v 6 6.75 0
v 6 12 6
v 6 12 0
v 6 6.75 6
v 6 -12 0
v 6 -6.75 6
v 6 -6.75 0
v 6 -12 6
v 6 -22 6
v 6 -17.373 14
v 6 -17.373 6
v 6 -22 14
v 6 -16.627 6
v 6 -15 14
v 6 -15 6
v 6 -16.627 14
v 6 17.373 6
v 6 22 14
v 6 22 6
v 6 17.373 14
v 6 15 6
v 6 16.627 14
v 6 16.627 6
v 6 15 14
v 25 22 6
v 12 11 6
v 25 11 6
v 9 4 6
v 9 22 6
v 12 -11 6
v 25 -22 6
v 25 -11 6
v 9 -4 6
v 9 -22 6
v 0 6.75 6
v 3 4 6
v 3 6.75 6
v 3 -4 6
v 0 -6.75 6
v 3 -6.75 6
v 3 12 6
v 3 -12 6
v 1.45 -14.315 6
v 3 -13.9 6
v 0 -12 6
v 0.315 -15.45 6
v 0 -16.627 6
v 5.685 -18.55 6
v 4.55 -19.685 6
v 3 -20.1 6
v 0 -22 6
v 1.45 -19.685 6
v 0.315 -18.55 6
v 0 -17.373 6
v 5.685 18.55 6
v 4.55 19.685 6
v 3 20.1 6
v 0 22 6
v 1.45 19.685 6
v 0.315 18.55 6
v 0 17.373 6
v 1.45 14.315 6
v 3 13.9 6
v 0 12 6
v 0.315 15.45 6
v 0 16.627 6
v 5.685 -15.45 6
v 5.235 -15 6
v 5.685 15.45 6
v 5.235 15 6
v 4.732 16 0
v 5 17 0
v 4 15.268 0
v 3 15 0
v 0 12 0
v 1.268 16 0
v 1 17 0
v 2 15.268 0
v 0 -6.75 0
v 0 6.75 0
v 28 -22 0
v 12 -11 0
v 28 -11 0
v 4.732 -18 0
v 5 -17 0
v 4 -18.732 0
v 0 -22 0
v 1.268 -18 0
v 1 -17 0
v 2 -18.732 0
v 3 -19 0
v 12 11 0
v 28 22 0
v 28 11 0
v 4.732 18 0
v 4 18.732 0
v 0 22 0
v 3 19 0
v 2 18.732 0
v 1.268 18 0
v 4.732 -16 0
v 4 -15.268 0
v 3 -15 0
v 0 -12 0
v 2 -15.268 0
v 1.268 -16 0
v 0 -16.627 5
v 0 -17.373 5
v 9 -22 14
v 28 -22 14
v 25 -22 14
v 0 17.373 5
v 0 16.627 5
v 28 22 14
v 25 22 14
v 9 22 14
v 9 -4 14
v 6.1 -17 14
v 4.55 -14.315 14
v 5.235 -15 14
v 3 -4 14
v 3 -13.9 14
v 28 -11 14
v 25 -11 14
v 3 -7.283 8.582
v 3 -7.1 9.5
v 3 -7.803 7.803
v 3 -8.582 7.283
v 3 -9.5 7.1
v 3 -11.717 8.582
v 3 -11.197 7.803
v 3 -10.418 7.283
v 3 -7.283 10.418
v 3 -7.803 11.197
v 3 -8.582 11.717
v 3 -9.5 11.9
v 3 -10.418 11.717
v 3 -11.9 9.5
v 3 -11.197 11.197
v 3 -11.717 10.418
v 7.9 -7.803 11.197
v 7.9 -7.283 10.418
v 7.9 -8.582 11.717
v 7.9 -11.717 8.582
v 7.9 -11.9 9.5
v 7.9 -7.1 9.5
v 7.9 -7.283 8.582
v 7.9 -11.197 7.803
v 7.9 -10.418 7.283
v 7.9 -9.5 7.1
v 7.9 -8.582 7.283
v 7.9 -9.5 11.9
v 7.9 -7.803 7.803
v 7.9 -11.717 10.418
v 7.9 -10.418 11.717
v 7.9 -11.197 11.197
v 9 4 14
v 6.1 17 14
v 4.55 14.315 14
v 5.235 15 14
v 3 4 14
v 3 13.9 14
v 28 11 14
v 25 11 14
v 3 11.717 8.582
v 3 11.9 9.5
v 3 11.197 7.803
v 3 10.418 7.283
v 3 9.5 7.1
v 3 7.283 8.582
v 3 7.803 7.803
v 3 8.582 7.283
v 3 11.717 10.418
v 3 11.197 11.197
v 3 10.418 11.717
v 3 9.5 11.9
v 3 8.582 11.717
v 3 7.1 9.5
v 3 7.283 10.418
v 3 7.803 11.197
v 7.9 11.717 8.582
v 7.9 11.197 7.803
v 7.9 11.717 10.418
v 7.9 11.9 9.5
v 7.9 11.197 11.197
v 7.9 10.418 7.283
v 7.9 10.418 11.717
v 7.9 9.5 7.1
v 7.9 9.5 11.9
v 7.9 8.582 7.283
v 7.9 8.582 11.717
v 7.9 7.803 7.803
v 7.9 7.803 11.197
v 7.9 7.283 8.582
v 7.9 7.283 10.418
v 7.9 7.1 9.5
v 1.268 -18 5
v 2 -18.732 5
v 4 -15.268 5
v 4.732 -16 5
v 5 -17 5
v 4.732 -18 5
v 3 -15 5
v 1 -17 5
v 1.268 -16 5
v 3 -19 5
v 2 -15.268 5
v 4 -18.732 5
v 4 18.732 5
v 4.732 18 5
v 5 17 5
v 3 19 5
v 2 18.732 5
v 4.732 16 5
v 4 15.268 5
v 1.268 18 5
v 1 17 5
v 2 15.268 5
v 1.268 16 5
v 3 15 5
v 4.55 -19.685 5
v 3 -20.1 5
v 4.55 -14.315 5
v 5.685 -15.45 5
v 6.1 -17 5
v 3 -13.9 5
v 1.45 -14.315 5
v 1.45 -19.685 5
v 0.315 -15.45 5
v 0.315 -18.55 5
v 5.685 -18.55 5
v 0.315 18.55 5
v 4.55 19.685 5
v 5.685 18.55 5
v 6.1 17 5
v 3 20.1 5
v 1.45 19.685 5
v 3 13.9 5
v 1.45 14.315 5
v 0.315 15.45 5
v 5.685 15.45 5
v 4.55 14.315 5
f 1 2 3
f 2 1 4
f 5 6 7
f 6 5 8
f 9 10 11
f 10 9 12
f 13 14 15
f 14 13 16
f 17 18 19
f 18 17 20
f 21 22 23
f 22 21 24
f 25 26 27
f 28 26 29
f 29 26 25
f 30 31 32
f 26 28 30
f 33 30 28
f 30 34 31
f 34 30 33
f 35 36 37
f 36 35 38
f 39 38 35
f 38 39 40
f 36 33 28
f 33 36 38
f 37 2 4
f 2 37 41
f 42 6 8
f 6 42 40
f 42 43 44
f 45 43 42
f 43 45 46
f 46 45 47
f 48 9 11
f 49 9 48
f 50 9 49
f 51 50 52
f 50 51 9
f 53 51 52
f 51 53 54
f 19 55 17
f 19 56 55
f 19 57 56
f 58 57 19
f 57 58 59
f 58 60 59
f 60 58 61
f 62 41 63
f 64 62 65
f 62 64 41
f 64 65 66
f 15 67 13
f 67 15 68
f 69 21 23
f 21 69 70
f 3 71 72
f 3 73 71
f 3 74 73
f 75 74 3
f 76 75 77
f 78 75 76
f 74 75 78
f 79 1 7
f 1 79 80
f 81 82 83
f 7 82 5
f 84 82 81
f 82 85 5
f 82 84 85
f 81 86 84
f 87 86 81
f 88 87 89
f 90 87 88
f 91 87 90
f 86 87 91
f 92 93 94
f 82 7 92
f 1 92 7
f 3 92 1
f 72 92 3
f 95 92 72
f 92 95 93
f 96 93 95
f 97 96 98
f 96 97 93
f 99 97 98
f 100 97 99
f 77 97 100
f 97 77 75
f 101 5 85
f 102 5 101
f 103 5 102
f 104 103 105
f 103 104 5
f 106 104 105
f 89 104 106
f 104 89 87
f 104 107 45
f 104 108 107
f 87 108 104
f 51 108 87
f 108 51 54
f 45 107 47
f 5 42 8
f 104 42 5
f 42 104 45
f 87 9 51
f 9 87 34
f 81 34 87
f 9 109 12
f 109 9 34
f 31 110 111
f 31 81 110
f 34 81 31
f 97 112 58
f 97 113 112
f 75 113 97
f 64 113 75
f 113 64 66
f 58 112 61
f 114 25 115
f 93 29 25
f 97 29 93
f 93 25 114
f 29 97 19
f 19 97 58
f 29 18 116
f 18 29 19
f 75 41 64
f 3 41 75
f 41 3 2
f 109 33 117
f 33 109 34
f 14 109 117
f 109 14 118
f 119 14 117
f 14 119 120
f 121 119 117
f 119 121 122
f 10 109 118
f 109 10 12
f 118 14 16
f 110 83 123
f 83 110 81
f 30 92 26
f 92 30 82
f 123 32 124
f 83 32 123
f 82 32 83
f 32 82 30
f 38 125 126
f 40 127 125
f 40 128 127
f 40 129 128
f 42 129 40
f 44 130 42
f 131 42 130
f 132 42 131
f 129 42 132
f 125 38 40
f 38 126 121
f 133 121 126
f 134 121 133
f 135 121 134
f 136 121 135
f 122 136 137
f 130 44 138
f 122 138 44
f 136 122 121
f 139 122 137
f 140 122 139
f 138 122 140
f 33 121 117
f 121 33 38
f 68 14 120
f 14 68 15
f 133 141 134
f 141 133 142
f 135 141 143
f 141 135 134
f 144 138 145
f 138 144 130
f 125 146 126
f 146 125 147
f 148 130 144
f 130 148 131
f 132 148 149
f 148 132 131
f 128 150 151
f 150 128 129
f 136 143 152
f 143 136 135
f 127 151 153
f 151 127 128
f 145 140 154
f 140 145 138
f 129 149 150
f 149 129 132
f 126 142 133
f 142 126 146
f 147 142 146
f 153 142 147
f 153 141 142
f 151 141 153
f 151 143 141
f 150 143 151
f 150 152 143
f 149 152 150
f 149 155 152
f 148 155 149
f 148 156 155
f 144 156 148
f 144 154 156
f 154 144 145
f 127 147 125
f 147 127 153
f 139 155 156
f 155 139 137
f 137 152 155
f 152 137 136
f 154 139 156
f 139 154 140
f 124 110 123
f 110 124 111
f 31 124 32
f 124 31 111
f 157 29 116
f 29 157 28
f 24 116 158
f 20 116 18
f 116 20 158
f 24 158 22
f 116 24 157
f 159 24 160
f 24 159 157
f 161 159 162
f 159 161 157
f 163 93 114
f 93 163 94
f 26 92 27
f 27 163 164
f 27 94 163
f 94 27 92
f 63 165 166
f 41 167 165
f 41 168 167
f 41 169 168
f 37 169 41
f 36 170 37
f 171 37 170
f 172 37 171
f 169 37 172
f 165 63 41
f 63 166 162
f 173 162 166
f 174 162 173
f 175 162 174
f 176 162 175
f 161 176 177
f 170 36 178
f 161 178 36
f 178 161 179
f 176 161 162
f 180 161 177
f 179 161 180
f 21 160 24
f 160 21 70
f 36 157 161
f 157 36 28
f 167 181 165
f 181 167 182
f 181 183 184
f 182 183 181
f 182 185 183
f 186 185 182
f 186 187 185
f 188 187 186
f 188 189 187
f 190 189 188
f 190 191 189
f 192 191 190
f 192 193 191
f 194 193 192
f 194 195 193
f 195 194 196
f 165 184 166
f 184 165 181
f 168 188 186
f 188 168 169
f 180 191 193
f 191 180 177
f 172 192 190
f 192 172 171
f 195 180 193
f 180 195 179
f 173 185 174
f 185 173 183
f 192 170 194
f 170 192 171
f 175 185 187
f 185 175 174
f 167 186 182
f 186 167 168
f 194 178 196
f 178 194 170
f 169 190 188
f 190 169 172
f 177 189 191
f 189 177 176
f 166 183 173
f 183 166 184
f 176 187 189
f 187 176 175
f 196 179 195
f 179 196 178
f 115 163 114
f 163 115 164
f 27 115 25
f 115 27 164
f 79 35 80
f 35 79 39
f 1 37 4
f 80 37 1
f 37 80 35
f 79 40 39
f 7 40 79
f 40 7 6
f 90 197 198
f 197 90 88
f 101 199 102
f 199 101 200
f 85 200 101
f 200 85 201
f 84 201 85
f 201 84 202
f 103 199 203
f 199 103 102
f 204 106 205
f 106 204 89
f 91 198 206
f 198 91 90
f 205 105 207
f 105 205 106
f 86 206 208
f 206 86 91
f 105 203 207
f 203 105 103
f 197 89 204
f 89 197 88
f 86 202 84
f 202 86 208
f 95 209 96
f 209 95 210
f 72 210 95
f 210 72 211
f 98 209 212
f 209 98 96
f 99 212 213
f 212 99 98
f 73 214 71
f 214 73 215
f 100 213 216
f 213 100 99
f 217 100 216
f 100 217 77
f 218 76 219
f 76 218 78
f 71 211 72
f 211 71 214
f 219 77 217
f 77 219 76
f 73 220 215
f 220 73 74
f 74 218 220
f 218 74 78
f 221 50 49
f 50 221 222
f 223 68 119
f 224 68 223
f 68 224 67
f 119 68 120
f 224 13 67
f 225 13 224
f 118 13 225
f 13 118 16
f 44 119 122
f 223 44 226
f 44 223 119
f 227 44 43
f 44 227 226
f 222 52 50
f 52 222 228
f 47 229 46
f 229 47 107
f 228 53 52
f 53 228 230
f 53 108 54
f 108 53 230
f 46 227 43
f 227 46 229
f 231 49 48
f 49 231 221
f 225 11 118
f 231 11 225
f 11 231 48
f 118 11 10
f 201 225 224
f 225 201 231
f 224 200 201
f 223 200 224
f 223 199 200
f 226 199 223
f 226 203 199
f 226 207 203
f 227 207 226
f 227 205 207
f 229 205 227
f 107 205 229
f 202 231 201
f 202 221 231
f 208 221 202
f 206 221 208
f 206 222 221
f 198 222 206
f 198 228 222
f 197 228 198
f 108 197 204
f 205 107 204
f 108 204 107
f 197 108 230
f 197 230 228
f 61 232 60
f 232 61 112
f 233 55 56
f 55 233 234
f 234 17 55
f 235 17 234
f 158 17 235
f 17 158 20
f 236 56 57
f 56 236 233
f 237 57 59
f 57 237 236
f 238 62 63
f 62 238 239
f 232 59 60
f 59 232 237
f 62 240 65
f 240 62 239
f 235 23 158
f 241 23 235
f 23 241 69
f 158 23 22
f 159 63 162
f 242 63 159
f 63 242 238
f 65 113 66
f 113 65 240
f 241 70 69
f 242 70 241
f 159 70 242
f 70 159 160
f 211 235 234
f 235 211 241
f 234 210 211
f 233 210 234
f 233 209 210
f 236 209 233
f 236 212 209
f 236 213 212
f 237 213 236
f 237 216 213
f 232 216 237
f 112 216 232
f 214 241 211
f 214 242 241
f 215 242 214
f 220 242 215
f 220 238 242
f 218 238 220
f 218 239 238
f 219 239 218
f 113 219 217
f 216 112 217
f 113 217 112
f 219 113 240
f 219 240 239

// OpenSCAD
left = true;

difference(){
	union(){
		translate ([6+3,0,3]) cube([6,44,6], center=true);
		translate ([0+3,0,3]) cube([6,13.5,6], center=true);
		for (y=[-1,1]) translate ([0+3,(5+12)*y,3])
			cube([6,10,6], center=true);
		for (y=[-1,1]) for (x=[0,1]) difference(){
			union(){
				translate([6,9.5*y,10])
					cube([6,11,8], center=true);
				if (left){
					translate([6+1.5+x*(16+3),16.5*y,7])
						cube([3,11,14], center=true);
					translate ([6+8+6,16.5*y,3]) 
						cube([16,11,6], center=true);
				}
			}
			translate([2.9,9.5*y,9.5])
				rotate([0,90,0]) cylinder(r=2.4,5,$fn=16);
		}
		if (!left) for(x=[0,1]){
				translate([6+1.5+x*(16+3),0,7])
					cube([3,11,14], center=true);
				translate ([6+8+6,0,3]) 
					cube([16,11,6], center=true);	
		}
	}
	for (y=[-1,1]) translate ([0+3,(5+12)*y,3])
		cylinder(r=2,h=10,center=true,$fn=12);
	for (y=[-1,1]) translate ([0+3,(5+12)*y,12])
		cylinder(r=3.1,h=14,center=true,$fn=12);
}
